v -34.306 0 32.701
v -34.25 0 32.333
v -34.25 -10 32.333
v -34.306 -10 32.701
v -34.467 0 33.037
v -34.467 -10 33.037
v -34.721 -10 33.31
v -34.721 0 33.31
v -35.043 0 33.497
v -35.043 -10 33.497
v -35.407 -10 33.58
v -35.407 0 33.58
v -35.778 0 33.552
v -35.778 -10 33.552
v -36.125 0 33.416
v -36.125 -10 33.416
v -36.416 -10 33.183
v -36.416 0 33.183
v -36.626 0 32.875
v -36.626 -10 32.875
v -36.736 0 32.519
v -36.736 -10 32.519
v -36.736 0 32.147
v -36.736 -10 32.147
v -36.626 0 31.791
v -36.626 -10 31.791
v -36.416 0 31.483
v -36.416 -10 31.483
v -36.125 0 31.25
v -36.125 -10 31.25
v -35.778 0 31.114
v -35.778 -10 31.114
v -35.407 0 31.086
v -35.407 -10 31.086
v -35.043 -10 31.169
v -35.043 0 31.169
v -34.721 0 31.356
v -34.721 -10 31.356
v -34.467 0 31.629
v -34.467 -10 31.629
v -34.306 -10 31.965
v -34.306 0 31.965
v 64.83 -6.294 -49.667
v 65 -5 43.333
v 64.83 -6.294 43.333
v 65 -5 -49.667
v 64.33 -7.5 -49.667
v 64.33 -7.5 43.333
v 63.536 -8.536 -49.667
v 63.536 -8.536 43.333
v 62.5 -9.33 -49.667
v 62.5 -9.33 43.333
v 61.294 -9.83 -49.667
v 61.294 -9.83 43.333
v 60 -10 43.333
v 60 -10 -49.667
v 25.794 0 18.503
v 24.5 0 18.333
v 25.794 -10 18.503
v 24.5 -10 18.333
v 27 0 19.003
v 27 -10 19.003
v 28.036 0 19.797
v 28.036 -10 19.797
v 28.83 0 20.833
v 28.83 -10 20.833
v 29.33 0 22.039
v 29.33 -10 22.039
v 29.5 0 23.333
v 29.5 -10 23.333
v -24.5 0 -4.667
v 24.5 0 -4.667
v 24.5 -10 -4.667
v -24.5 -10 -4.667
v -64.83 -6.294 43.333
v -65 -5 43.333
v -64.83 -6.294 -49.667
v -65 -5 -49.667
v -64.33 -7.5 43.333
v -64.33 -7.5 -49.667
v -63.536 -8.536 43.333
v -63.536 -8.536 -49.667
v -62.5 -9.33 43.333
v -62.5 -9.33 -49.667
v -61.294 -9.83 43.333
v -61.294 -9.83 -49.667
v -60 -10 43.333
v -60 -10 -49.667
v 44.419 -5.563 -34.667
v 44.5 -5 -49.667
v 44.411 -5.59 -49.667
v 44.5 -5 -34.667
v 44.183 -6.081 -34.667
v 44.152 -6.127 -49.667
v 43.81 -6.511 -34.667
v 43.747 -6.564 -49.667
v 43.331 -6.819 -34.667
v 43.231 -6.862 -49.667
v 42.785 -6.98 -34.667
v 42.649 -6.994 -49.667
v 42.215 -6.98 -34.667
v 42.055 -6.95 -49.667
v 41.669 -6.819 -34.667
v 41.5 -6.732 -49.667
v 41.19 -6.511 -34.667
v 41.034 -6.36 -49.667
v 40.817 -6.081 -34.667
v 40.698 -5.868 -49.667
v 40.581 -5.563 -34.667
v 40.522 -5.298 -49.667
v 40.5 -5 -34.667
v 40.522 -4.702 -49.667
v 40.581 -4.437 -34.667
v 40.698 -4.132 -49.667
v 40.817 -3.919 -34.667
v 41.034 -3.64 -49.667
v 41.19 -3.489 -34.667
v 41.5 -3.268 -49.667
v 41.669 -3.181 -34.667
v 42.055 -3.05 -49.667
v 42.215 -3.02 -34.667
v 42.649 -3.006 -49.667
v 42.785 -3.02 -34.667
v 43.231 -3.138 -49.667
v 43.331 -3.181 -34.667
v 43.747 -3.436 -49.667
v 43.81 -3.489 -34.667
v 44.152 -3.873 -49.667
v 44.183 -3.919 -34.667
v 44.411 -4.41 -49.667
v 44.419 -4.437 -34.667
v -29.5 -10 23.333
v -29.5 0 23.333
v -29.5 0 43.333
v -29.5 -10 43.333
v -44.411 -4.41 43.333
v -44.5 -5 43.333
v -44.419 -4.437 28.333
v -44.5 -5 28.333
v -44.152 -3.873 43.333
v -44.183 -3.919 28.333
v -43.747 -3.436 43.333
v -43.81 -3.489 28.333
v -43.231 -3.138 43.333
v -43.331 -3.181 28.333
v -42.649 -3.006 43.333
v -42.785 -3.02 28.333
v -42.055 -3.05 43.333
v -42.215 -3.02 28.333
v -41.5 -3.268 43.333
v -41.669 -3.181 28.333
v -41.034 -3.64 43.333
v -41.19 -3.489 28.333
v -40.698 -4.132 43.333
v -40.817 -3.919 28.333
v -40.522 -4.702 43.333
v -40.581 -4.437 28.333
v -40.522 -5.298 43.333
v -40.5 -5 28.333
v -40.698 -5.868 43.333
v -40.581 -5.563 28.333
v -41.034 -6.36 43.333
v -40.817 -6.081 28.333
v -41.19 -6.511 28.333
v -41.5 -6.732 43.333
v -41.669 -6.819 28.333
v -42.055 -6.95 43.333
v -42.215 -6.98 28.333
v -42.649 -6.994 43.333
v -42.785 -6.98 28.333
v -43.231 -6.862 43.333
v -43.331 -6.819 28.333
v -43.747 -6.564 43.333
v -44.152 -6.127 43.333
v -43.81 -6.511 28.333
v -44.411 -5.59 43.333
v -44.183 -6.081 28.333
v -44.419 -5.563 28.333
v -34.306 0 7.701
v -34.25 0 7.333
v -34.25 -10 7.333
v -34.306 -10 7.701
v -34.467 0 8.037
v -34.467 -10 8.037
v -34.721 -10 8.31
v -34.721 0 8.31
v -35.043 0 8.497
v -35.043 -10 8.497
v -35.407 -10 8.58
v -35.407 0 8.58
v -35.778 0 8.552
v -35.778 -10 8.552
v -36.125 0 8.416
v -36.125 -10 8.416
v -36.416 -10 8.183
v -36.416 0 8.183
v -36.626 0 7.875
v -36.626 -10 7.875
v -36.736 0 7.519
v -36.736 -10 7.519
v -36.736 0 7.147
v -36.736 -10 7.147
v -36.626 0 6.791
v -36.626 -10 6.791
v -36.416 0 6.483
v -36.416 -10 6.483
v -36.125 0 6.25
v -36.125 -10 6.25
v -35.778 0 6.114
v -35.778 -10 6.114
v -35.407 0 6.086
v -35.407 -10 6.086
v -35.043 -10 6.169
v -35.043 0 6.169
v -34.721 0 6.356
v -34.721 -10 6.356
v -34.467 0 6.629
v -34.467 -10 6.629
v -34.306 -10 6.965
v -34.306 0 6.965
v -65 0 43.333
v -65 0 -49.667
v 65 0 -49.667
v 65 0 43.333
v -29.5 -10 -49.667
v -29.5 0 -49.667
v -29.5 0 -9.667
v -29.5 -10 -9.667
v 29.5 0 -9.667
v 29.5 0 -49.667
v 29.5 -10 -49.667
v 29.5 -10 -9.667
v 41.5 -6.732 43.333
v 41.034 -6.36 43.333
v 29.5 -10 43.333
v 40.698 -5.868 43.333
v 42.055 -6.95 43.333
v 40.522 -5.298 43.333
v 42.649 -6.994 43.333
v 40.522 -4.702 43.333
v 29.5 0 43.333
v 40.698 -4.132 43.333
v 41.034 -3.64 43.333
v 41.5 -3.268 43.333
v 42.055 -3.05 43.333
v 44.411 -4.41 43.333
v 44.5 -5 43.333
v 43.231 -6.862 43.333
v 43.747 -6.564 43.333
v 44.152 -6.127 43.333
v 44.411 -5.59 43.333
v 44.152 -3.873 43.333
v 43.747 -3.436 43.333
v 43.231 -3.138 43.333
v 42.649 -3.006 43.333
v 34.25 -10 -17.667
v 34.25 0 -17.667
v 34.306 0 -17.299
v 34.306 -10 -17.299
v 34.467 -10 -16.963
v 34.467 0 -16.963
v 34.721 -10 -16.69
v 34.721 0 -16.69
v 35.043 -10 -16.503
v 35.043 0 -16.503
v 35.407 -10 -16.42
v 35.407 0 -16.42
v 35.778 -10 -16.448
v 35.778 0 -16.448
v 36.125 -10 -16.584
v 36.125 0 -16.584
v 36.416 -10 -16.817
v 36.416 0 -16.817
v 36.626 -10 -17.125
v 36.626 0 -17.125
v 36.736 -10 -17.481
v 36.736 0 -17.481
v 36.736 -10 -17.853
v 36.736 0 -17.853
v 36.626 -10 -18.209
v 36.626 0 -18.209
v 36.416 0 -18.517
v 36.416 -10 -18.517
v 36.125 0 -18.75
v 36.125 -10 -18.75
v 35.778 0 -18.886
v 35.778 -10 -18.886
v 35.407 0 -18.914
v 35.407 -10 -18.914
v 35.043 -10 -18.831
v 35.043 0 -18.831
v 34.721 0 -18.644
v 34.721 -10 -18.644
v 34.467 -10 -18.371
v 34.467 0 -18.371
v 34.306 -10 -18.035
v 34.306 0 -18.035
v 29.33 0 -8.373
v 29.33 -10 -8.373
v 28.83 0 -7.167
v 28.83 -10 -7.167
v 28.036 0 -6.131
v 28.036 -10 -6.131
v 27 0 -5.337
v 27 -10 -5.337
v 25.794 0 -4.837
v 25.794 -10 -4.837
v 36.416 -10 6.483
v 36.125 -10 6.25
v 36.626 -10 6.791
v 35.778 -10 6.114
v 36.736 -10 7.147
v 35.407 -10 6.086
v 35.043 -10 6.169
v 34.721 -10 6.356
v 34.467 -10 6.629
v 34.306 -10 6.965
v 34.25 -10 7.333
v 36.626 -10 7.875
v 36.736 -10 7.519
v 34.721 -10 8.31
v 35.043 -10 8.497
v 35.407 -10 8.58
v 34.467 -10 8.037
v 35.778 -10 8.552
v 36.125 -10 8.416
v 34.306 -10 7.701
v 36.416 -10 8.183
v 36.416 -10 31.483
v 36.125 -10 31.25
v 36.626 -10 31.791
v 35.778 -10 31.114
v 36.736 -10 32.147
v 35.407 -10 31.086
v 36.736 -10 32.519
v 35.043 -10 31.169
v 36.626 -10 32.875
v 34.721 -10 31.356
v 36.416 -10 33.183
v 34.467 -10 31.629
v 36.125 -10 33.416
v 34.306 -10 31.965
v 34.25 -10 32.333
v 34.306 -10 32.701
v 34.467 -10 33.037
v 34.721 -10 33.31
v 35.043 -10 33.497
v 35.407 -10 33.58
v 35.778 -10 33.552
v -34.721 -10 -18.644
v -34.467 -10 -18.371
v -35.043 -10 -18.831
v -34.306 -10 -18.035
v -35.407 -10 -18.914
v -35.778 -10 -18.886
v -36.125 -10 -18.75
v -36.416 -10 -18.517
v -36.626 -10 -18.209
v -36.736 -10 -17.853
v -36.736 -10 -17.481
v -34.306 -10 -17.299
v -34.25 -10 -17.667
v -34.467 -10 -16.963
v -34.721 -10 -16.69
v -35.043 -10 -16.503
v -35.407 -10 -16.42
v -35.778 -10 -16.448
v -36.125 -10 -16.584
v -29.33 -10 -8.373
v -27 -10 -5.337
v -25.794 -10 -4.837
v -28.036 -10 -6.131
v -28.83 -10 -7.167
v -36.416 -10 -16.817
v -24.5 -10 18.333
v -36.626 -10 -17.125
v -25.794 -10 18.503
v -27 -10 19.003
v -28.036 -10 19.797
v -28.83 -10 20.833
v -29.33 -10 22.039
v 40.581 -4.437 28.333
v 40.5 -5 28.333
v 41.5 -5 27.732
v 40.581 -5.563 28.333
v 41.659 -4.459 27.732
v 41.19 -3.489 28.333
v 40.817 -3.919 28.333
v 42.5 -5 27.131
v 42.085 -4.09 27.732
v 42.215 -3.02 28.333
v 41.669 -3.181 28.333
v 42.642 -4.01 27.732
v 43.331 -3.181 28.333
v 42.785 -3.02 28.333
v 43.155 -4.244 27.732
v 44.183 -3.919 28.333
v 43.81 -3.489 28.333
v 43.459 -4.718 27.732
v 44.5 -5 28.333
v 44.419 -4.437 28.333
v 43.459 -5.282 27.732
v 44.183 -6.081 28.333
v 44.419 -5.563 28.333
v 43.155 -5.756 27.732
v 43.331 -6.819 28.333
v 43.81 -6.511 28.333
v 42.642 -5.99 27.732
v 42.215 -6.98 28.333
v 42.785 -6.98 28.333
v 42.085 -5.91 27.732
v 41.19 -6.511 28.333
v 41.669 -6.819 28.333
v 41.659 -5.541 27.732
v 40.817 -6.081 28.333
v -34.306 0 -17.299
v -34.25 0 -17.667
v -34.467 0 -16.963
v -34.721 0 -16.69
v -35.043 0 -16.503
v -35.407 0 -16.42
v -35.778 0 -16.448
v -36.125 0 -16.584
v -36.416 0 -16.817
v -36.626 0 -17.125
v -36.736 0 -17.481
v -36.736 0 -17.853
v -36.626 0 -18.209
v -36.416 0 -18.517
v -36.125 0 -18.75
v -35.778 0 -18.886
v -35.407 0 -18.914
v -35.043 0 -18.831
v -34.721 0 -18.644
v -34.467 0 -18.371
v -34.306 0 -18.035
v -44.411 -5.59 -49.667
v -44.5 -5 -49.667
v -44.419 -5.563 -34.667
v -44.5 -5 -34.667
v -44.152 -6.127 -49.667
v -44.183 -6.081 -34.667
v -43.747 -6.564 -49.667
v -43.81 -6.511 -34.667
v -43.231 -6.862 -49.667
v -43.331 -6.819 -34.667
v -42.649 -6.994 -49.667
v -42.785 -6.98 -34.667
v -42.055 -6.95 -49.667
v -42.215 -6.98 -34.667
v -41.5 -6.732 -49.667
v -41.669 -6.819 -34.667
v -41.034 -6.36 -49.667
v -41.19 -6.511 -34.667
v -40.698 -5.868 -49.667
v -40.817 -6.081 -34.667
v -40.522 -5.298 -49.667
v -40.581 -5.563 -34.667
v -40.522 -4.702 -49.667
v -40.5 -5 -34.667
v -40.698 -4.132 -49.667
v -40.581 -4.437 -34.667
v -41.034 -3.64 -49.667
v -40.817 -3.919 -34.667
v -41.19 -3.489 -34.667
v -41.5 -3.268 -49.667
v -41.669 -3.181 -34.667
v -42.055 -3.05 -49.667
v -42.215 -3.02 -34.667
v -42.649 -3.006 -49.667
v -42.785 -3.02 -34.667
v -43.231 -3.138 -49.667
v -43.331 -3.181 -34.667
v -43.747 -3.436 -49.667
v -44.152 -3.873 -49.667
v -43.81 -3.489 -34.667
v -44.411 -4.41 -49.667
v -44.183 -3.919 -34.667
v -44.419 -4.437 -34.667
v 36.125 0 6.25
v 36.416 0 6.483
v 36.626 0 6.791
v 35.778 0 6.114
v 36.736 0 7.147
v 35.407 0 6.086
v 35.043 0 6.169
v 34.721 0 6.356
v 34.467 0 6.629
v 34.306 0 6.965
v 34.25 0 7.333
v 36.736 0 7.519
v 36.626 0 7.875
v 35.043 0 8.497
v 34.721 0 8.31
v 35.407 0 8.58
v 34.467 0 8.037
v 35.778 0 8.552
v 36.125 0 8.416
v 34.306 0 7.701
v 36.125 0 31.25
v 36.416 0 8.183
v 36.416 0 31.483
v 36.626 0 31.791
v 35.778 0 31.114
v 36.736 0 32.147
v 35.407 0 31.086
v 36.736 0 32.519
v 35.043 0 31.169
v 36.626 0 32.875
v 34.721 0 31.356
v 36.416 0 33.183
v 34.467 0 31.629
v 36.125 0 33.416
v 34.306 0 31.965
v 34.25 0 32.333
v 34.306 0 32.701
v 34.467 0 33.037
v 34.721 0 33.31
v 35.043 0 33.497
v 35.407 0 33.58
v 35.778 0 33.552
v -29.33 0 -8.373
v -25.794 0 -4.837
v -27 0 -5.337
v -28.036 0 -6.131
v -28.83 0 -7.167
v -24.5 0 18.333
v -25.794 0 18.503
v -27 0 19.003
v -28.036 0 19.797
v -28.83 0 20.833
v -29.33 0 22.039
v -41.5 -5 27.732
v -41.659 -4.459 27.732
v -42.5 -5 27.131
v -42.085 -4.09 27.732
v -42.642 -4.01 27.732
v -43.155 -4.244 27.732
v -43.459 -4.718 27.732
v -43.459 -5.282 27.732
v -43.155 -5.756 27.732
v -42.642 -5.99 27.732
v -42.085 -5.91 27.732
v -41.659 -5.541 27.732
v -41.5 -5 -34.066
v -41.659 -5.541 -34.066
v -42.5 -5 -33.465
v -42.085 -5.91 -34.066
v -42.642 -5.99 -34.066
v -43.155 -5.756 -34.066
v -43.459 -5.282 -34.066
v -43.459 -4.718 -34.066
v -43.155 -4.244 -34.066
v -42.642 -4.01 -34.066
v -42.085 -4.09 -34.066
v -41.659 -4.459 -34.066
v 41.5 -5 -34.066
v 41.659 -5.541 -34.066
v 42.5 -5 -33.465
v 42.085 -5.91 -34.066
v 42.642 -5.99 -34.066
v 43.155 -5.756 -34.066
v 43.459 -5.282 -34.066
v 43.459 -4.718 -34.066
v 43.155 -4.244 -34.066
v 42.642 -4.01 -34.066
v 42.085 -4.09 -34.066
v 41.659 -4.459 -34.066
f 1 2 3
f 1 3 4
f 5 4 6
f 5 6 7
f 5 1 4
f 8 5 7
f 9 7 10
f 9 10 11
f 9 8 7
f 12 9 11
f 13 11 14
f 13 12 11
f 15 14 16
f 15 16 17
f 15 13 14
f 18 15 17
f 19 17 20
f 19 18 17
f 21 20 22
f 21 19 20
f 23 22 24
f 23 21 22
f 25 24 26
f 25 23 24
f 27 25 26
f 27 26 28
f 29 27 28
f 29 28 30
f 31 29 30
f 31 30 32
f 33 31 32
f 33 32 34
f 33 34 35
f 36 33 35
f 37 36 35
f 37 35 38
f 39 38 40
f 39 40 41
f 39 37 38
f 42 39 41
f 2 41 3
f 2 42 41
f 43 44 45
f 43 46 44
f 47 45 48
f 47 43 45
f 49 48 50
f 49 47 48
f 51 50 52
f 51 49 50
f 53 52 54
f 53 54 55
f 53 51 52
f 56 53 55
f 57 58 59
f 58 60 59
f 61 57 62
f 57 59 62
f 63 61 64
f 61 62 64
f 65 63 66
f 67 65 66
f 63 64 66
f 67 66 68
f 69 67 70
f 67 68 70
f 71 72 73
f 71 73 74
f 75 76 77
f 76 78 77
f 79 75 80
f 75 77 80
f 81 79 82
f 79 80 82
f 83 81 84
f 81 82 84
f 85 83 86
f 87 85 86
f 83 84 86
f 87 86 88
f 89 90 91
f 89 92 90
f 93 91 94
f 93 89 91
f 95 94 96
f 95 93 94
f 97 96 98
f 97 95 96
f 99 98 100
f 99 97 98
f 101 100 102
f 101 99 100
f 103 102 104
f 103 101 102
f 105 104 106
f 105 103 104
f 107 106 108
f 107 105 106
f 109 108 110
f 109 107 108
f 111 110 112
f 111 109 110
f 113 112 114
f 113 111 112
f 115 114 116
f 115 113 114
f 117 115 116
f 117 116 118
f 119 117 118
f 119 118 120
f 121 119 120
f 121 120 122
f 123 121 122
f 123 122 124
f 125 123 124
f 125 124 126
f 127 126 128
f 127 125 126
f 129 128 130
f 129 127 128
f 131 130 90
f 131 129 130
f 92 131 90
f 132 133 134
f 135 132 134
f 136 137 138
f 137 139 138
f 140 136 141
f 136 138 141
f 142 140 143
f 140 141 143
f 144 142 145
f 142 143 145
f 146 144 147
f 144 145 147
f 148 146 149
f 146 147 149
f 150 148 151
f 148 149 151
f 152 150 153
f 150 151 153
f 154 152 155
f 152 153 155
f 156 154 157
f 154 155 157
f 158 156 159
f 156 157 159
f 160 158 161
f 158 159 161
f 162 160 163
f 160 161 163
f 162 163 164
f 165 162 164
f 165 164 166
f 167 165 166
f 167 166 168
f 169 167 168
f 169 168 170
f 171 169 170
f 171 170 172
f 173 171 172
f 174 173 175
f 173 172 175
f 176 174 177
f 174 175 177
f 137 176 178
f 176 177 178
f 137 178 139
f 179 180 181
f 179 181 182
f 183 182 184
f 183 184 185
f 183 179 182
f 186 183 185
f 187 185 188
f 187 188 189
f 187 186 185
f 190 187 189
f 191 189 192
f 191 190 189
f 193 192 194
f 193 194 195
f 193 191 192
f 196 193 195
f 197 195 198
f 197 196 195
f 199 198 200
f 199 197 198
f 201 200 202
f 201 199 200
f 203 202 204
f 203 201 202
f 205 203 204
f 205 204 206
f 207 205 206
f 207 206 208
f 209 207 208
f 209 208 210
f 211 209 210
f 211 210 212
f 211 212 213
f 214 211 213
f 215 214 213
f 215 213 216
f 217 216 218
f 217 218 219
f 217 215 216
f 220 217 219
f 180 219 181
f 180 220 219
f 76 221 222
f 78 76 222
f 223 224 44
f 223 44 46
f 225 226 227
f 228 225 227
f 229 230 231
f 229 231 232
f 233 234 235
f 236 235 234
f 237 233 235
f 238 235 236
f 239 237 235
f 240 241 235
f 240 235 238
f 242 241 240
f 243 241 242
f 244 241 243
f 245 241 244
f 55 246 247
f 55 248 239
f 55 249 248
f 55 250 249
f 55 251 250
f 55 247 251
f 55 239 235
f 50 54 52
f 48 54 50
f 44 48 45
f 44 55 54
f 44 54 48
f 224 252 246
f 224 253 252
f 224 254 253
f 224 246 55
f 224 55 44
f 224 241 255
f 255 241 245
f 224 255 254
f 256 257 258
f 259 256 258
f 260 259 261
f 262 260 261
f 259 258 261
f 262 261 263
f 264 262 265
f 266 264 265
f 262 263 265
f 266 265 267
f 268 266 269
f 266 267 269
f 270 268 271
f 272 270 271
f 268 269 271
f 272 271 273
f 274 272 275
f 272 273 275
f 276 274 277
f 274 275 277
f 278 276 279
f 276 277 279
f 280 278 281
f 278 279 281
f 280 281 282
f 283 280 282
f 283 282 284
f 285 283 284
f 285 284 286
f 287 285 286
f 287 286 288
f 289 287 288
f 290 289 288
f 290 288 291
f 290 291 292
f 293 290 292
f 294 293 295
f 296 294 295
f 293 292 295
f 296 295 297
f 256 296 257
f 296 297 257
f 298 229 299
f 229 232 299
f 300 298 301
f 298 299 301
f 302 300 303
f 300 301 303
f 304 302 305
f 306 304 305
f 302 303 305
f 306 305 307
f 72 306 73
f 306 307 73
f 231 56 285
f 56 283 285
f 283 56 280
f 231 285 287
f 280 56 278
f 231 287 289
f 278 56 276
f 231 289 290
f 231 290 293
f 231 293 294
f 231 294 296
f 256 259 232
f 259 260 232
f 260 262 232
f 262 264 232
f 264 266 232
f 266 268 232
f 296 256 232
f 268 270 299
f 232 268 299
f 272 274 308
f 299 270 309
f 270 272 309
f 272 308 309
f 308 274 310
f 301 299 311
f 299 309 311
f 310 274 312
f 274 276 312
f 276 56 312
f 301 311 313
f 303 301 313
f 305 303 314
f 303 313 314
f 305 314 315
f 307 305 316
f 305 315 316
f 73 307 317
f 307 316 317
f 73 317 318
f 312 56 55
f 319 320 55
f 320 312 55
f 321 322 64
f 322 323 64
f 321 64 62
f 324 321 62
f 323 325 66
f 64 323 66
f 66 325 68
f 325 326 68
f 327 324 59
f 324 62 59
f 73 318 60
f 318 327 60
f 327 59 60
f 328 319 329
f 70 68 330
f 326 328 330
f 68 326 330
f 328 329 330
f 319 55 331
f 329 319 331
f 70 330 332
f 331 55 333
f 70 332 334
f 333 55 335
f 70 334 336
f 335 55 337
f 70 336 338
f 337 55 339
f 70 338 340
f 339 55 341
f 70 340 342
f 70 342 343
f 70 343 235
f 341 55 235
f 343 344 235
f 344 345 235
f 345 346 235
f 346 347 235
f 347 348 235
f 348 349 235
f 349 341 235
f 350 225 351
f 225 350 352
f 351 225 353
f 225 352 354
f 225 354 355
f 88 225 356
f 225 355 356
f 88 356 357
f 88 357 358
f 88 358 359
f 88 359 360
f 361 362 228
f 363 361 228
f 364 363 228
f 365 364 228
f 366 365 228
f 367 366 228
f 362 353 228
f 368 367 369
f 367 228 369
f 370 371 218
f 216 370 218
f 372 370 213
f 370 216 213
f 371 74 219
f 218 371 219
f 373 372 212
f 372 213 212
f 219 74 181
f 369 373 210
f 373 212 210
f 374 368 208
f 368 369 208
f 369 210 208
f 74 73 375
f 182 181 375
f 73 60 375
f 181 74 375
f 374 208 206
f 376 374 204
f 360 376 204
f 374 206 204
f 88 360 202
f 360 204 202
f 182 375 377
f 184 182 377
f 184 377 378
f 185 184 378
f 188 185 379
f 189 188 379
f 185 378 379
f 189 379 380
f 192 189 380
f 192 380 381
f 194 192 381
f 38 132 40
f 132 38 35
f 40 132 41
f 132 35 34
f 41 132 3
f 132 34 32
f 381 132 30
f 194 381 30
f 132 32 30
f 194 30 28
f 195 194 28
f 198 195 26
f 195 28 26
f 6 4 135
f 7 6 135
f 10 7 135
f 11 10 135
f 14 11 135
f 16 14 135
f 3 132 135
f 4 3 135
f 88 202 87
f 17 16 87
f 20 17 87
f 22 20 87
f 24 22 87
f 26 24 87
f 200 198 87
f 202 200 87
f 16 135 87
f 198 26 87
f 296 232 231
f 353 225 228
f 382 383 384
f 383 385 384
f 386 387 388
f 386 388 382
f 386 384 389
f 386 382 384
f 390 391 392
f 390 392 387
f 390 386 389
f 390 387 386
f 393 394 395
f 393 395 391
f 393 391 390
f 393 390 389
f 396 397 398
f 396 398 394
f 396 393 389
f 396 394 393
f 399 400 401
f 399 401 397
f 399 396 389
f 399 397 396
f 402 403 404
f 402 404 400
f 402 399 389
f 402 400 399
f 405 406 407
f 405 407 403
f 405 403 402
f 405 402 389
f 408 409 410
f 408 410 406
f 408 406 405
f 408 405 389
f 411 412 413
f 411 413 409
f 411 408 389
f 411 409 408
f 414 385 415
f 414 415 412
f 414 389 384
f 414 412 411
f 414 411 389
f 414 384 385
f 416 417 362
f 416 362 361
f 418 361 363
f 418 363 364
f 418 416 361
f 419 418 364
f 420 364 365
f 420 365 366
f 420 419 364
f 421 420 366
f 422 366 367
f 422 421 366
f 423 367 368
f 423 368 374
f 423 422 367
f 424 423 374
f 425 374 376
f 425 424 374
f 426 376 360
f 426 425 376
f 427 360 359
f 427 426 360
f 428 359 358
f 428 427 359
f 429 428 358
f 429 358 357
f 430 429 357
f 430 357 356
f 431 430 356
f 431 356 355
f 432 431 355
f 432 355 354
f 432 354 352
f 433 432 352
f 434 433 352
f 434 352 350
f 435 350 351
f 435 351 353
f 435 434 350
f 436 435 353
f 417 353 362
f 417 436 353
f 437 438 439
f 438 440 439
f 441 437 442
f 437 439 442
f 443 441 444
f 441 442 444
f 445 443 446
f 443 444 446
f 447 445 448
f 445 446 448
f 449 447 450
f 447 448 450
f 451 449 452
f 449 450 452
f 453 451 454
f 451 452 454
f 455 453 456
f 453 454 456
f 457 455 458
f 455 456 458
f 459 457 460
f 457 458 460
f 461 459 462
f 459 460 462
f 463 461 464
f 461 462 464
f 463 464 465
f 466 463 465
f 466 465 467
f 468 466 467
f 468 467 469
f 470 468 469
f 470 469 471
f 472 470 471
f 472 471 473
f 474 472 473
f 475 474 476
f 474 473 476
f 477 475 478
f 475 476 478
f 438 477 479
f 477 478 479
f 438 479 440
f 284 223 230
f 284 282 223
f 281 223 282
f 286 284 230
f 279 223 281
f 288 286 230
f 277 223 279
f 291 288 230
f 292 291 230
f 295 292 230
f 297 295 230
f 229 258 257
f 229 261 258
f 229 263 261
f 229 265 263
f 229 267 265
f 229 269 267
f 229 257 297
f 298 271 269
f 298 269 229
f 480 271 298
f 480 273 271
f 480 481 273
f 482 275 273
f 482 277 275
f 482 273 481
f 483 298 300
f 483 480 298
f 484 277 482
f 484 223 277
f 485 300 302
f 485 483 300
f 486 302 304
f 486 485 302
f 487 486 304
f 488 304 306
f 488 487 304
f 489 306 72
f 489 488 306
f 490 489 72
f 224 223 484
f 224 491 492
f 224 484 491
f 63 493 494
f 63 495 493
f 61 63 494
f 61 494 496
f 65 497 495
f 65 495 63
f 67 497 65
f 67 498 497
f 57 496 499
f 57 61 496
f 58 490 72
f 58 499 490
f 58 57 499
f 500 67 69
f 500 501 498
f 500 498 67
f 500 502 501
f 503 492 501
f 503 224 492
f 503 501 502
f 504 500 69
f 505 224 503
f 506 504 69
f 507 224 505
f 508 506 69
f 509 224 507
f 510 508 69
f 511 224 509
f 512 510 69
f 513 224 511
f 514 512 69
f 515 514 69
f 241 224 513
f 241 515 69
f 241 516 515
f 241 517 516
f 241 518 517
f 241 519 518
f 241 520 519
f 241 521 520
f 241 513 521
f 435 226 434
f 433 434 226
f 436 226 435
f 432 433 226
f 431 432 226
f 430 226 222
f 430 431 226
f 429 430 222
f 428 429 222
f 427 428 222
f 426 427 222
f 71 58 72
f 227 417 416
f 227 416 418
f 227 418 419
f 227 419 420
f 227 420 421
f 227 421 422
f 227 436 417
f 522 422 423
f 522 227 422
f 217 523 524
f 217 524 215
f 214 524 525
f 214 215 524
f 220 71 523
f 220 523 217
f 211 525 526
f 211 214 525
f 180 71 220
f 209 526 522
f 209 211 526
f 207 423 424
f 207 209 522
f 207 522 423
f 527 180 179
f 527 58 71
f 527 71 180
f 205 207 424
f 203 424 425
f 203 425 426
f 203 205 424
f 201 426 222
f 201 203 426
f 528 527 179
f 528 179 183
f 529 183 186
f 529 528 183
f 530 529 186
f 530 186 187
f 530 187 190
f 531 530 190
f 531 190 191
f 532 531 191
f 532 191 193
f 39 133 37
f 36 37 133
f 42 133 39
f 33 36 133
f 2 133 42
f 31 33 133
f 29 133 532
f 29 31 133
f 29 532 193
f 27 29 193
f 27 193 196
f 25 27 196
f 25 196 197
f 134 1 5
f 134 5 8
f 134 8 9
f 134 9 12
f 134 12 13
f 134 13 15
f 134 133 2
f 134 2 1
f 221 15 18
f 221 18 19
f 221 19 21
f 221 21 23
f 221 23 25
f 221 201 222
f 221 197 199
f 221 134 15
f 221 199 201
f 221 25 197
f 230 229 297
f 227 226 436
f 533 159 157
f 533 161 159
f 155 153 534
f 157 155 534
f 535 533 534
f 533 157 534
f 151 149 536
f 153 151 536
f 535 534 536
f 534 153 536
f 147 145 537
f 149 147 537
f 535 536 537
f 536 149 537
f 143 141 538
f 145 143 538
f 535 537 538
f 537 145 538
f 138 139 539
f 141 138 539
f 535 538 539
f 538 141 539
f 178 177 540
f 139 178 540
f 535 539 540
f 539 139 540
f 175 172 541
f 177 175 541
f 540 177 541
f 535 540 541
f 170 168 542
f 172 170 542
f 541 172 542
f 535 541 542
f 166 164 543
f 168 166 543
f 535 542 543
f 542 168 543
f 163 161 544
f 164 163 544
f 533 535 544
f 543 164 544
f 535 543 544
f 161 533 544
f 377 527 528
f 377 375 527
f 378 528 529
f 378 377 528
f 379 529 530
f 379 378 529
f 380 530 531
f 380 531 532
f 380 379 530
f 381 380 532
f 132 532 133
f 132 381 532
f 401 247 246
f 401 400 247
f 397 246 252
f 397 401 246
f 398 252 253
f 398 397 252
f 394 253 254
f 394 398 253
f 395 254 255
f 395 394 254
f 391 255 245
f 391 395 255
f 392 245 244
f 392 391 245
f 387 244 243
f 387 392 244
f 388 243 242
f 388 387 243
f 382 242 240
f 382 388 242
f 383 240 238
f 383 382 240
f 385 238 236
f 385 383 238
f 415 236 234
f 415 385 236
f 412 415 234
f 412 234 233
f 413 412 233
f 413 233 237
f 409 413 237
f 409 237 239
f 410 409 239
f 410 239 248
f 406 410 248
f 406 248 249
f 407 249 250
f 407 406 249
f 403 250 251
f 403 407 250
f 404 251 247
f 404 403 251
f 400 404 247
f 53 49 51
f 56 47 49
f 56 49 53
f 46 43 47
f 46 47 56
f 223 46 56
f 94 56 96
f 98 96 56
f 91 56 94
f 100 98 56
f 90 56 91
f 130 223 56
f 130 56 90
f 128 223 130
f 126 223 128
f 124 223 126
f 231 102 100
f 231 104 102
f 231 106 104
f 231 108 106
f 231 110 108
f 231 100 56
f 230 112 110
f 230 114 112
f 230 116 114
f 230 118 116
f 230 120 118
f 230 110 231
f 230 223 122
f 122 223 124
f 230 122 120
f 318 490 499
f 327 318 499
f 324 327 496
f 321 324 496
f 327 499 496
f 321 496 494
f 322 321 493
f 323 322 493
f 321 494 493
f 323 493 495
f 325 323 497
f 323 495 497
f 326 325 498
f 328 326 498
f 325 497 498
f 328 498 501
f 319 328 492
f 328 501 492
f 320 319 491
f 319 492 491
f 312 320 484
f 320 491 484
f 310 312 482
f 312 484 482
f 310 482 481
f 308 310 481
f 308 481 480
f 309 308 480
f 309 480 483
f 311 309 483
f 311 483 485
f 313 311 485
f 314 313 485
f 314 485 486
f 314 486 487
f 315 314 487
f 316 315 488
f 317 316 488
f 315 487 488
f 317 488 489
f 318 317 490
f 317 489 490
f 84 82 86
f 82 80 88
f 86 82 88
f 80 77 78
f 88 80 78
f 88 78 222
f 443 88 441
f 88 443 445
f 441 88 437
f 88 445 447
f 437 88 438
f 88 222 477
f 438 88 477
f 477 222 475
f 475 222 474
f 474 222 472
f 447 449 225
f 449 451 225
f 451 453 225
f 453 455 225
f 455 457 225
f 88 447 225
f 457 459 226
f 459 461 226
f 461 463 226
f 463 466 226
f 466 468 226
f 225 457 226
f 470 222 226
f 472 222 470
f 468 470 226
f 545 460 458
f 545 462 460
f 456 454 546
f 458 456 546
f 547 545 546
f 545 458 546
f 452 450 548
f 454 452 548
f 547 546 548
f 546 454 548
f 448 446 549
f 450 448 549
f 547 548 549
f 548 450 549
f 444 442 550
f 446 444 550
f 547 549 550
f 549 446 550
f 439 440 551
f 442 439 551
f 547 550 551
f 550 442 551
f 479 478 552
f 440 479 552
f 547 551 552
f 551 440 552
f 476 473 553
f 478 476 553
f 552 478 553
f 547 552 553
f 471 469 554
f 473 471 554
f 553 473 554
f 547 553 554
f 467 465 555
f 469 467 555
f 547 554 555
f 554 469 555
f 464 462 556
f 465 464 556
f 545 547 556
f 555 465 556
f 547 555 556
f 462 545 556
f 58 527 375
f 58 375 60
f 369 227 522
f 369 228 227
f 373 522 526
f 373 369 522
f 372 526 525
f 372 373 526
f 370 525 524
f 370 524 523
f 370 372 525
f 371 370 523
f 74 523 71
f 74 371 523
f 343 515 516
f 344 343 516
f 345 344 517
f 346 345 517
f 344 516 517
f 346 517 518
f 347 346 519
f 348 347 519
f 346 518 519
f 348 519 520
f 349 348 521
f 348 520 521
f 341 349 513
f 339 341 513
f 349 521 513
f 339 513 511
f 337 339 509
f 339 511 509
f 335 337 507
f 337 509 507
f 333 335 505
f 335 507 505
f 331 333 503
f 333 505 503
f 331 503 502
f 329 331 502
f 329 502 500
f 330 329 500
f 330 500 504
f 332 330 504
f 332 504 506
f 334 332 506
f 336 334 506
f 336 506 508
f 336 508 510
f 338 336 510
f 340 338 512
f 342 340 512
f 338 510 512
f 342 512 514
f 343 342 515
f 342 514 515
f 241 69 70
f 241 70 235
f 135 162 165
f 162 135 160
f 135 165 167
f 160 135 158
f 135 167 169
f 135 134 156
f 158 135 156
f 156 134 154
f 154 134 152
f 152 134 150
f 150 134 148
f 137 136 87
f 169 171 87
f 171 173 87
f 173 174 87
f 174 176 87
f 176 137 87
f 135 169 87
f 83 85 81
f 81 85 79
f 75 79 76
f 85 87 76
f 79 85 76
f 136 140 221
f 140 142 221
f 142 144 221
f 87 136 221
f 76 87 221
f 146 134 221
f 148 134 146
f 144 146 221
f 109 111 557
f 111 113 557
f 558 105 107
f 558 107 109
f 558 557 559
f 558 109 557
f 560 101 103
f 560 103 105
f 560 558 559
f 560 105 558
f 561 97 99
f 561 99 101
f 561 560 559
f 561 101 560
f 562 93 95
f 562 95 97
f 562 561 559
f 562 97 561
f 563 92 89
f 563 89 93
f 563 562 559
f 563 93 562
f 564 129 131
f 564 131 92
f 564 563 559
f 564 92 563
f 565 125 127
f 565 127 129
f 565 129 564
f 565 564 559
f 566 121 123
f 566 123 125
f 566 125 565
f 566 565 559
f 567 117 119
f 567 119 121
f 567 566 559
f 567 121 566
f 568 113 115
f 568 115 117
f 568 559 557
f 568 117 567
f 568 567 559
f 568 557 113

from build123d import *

# Parameters (mm, degrees)
F0_R           = 1.25
F1_DEPTH       = 10
F2_R           = 5
F5_D           = 4
F5_DEPTH       = 15
F5_TIP         = 1.2017212381
F5_ON_F4_D     = 4
F5_ON_F4_DEPTH = 15
F5_ON_F4_TIP   = 1.2017212381


with BuildPart() as f1:
    # F0 (on Front) → F1 (new body)
    with BuildSketch(Plane.XZ):
        Polygon((-65, 43.3330013267), (-65, -49.6669986733), (-29.5, -49.6669986733), (-29.5, -4.6669986733), (0, -4.6669986733), (0, 18.3330013267), (-29.5, 18.3330013267), (-29.5, 43.3330013267), align=None)
        with Locations((-35.5, -42.6669986733)):
            Circle(F0_R, mode=Mode.SUBTRACT)
        with Locations((-35.5, -17.6669986733)):
            Circle(F0_R, mode=Mode.SUBTRACT)
        with Locations((-35.5, 7.3330013267)):
            Circle(F0_R, mode=Mode.SUBTRACT)
        with Locations((-35.5, 32.3330013267)):
            Circle(F0_R, mode=Mode.SUBTRACT)
        with Locations((-35.5, -42.6669986733)):
            Circle(F0_R)
    extrude(amount=F1_DEPTH)

    # F2
    f2_edges = [f1.edges().sort_by_distance(p)[0] for p in [
        (-65, -10, -3.166999),
        (-29.5, -5, -4.666999),
        (-29.5, -5, 18.333001),
    ]]
    fillet(f2_edges, radius=F2_R)

    # F5
    with Locations(Plane.XY.offset(43.3330013267)):
        with Locations((-42.5, -5)):
            Hole(F5_D / 2, depth=F5_DEPTH)
            with Locations((0, 0, -(F5_DEPTH + F5_TIP / 2))):  # 118° drill point
                Cone(0, F5_D / 2, F5_TIP, mode=Mode.SUBTRACT)

    # F5 on F4
    with Locations(Plane(origin=(0, 0, -49.6669986733), x_dir=(1, 0, 0), z_dir=(0, 0, -1))):
        with Locations((-42.5, 5)):
            Hole(F5_ON_F4_D / 2, depth=F5_ON_F4_DEPTH)
            with Locations((0, 0, -(F5_ON_F4_DEPTH + F5_ON_F4_TIP / 2))):  # 118° drill point
                Cone(0, F5_ON_F4_D / 2, F5_ON_F4_TIP, mode=Mode.SUBTRACT)

    # F6: F1 across plane


with BuildPart() as f1_1:
    add(f1.part)
    add(f1.part.mirror(Plane.YZ))


solid = f1_1.part
